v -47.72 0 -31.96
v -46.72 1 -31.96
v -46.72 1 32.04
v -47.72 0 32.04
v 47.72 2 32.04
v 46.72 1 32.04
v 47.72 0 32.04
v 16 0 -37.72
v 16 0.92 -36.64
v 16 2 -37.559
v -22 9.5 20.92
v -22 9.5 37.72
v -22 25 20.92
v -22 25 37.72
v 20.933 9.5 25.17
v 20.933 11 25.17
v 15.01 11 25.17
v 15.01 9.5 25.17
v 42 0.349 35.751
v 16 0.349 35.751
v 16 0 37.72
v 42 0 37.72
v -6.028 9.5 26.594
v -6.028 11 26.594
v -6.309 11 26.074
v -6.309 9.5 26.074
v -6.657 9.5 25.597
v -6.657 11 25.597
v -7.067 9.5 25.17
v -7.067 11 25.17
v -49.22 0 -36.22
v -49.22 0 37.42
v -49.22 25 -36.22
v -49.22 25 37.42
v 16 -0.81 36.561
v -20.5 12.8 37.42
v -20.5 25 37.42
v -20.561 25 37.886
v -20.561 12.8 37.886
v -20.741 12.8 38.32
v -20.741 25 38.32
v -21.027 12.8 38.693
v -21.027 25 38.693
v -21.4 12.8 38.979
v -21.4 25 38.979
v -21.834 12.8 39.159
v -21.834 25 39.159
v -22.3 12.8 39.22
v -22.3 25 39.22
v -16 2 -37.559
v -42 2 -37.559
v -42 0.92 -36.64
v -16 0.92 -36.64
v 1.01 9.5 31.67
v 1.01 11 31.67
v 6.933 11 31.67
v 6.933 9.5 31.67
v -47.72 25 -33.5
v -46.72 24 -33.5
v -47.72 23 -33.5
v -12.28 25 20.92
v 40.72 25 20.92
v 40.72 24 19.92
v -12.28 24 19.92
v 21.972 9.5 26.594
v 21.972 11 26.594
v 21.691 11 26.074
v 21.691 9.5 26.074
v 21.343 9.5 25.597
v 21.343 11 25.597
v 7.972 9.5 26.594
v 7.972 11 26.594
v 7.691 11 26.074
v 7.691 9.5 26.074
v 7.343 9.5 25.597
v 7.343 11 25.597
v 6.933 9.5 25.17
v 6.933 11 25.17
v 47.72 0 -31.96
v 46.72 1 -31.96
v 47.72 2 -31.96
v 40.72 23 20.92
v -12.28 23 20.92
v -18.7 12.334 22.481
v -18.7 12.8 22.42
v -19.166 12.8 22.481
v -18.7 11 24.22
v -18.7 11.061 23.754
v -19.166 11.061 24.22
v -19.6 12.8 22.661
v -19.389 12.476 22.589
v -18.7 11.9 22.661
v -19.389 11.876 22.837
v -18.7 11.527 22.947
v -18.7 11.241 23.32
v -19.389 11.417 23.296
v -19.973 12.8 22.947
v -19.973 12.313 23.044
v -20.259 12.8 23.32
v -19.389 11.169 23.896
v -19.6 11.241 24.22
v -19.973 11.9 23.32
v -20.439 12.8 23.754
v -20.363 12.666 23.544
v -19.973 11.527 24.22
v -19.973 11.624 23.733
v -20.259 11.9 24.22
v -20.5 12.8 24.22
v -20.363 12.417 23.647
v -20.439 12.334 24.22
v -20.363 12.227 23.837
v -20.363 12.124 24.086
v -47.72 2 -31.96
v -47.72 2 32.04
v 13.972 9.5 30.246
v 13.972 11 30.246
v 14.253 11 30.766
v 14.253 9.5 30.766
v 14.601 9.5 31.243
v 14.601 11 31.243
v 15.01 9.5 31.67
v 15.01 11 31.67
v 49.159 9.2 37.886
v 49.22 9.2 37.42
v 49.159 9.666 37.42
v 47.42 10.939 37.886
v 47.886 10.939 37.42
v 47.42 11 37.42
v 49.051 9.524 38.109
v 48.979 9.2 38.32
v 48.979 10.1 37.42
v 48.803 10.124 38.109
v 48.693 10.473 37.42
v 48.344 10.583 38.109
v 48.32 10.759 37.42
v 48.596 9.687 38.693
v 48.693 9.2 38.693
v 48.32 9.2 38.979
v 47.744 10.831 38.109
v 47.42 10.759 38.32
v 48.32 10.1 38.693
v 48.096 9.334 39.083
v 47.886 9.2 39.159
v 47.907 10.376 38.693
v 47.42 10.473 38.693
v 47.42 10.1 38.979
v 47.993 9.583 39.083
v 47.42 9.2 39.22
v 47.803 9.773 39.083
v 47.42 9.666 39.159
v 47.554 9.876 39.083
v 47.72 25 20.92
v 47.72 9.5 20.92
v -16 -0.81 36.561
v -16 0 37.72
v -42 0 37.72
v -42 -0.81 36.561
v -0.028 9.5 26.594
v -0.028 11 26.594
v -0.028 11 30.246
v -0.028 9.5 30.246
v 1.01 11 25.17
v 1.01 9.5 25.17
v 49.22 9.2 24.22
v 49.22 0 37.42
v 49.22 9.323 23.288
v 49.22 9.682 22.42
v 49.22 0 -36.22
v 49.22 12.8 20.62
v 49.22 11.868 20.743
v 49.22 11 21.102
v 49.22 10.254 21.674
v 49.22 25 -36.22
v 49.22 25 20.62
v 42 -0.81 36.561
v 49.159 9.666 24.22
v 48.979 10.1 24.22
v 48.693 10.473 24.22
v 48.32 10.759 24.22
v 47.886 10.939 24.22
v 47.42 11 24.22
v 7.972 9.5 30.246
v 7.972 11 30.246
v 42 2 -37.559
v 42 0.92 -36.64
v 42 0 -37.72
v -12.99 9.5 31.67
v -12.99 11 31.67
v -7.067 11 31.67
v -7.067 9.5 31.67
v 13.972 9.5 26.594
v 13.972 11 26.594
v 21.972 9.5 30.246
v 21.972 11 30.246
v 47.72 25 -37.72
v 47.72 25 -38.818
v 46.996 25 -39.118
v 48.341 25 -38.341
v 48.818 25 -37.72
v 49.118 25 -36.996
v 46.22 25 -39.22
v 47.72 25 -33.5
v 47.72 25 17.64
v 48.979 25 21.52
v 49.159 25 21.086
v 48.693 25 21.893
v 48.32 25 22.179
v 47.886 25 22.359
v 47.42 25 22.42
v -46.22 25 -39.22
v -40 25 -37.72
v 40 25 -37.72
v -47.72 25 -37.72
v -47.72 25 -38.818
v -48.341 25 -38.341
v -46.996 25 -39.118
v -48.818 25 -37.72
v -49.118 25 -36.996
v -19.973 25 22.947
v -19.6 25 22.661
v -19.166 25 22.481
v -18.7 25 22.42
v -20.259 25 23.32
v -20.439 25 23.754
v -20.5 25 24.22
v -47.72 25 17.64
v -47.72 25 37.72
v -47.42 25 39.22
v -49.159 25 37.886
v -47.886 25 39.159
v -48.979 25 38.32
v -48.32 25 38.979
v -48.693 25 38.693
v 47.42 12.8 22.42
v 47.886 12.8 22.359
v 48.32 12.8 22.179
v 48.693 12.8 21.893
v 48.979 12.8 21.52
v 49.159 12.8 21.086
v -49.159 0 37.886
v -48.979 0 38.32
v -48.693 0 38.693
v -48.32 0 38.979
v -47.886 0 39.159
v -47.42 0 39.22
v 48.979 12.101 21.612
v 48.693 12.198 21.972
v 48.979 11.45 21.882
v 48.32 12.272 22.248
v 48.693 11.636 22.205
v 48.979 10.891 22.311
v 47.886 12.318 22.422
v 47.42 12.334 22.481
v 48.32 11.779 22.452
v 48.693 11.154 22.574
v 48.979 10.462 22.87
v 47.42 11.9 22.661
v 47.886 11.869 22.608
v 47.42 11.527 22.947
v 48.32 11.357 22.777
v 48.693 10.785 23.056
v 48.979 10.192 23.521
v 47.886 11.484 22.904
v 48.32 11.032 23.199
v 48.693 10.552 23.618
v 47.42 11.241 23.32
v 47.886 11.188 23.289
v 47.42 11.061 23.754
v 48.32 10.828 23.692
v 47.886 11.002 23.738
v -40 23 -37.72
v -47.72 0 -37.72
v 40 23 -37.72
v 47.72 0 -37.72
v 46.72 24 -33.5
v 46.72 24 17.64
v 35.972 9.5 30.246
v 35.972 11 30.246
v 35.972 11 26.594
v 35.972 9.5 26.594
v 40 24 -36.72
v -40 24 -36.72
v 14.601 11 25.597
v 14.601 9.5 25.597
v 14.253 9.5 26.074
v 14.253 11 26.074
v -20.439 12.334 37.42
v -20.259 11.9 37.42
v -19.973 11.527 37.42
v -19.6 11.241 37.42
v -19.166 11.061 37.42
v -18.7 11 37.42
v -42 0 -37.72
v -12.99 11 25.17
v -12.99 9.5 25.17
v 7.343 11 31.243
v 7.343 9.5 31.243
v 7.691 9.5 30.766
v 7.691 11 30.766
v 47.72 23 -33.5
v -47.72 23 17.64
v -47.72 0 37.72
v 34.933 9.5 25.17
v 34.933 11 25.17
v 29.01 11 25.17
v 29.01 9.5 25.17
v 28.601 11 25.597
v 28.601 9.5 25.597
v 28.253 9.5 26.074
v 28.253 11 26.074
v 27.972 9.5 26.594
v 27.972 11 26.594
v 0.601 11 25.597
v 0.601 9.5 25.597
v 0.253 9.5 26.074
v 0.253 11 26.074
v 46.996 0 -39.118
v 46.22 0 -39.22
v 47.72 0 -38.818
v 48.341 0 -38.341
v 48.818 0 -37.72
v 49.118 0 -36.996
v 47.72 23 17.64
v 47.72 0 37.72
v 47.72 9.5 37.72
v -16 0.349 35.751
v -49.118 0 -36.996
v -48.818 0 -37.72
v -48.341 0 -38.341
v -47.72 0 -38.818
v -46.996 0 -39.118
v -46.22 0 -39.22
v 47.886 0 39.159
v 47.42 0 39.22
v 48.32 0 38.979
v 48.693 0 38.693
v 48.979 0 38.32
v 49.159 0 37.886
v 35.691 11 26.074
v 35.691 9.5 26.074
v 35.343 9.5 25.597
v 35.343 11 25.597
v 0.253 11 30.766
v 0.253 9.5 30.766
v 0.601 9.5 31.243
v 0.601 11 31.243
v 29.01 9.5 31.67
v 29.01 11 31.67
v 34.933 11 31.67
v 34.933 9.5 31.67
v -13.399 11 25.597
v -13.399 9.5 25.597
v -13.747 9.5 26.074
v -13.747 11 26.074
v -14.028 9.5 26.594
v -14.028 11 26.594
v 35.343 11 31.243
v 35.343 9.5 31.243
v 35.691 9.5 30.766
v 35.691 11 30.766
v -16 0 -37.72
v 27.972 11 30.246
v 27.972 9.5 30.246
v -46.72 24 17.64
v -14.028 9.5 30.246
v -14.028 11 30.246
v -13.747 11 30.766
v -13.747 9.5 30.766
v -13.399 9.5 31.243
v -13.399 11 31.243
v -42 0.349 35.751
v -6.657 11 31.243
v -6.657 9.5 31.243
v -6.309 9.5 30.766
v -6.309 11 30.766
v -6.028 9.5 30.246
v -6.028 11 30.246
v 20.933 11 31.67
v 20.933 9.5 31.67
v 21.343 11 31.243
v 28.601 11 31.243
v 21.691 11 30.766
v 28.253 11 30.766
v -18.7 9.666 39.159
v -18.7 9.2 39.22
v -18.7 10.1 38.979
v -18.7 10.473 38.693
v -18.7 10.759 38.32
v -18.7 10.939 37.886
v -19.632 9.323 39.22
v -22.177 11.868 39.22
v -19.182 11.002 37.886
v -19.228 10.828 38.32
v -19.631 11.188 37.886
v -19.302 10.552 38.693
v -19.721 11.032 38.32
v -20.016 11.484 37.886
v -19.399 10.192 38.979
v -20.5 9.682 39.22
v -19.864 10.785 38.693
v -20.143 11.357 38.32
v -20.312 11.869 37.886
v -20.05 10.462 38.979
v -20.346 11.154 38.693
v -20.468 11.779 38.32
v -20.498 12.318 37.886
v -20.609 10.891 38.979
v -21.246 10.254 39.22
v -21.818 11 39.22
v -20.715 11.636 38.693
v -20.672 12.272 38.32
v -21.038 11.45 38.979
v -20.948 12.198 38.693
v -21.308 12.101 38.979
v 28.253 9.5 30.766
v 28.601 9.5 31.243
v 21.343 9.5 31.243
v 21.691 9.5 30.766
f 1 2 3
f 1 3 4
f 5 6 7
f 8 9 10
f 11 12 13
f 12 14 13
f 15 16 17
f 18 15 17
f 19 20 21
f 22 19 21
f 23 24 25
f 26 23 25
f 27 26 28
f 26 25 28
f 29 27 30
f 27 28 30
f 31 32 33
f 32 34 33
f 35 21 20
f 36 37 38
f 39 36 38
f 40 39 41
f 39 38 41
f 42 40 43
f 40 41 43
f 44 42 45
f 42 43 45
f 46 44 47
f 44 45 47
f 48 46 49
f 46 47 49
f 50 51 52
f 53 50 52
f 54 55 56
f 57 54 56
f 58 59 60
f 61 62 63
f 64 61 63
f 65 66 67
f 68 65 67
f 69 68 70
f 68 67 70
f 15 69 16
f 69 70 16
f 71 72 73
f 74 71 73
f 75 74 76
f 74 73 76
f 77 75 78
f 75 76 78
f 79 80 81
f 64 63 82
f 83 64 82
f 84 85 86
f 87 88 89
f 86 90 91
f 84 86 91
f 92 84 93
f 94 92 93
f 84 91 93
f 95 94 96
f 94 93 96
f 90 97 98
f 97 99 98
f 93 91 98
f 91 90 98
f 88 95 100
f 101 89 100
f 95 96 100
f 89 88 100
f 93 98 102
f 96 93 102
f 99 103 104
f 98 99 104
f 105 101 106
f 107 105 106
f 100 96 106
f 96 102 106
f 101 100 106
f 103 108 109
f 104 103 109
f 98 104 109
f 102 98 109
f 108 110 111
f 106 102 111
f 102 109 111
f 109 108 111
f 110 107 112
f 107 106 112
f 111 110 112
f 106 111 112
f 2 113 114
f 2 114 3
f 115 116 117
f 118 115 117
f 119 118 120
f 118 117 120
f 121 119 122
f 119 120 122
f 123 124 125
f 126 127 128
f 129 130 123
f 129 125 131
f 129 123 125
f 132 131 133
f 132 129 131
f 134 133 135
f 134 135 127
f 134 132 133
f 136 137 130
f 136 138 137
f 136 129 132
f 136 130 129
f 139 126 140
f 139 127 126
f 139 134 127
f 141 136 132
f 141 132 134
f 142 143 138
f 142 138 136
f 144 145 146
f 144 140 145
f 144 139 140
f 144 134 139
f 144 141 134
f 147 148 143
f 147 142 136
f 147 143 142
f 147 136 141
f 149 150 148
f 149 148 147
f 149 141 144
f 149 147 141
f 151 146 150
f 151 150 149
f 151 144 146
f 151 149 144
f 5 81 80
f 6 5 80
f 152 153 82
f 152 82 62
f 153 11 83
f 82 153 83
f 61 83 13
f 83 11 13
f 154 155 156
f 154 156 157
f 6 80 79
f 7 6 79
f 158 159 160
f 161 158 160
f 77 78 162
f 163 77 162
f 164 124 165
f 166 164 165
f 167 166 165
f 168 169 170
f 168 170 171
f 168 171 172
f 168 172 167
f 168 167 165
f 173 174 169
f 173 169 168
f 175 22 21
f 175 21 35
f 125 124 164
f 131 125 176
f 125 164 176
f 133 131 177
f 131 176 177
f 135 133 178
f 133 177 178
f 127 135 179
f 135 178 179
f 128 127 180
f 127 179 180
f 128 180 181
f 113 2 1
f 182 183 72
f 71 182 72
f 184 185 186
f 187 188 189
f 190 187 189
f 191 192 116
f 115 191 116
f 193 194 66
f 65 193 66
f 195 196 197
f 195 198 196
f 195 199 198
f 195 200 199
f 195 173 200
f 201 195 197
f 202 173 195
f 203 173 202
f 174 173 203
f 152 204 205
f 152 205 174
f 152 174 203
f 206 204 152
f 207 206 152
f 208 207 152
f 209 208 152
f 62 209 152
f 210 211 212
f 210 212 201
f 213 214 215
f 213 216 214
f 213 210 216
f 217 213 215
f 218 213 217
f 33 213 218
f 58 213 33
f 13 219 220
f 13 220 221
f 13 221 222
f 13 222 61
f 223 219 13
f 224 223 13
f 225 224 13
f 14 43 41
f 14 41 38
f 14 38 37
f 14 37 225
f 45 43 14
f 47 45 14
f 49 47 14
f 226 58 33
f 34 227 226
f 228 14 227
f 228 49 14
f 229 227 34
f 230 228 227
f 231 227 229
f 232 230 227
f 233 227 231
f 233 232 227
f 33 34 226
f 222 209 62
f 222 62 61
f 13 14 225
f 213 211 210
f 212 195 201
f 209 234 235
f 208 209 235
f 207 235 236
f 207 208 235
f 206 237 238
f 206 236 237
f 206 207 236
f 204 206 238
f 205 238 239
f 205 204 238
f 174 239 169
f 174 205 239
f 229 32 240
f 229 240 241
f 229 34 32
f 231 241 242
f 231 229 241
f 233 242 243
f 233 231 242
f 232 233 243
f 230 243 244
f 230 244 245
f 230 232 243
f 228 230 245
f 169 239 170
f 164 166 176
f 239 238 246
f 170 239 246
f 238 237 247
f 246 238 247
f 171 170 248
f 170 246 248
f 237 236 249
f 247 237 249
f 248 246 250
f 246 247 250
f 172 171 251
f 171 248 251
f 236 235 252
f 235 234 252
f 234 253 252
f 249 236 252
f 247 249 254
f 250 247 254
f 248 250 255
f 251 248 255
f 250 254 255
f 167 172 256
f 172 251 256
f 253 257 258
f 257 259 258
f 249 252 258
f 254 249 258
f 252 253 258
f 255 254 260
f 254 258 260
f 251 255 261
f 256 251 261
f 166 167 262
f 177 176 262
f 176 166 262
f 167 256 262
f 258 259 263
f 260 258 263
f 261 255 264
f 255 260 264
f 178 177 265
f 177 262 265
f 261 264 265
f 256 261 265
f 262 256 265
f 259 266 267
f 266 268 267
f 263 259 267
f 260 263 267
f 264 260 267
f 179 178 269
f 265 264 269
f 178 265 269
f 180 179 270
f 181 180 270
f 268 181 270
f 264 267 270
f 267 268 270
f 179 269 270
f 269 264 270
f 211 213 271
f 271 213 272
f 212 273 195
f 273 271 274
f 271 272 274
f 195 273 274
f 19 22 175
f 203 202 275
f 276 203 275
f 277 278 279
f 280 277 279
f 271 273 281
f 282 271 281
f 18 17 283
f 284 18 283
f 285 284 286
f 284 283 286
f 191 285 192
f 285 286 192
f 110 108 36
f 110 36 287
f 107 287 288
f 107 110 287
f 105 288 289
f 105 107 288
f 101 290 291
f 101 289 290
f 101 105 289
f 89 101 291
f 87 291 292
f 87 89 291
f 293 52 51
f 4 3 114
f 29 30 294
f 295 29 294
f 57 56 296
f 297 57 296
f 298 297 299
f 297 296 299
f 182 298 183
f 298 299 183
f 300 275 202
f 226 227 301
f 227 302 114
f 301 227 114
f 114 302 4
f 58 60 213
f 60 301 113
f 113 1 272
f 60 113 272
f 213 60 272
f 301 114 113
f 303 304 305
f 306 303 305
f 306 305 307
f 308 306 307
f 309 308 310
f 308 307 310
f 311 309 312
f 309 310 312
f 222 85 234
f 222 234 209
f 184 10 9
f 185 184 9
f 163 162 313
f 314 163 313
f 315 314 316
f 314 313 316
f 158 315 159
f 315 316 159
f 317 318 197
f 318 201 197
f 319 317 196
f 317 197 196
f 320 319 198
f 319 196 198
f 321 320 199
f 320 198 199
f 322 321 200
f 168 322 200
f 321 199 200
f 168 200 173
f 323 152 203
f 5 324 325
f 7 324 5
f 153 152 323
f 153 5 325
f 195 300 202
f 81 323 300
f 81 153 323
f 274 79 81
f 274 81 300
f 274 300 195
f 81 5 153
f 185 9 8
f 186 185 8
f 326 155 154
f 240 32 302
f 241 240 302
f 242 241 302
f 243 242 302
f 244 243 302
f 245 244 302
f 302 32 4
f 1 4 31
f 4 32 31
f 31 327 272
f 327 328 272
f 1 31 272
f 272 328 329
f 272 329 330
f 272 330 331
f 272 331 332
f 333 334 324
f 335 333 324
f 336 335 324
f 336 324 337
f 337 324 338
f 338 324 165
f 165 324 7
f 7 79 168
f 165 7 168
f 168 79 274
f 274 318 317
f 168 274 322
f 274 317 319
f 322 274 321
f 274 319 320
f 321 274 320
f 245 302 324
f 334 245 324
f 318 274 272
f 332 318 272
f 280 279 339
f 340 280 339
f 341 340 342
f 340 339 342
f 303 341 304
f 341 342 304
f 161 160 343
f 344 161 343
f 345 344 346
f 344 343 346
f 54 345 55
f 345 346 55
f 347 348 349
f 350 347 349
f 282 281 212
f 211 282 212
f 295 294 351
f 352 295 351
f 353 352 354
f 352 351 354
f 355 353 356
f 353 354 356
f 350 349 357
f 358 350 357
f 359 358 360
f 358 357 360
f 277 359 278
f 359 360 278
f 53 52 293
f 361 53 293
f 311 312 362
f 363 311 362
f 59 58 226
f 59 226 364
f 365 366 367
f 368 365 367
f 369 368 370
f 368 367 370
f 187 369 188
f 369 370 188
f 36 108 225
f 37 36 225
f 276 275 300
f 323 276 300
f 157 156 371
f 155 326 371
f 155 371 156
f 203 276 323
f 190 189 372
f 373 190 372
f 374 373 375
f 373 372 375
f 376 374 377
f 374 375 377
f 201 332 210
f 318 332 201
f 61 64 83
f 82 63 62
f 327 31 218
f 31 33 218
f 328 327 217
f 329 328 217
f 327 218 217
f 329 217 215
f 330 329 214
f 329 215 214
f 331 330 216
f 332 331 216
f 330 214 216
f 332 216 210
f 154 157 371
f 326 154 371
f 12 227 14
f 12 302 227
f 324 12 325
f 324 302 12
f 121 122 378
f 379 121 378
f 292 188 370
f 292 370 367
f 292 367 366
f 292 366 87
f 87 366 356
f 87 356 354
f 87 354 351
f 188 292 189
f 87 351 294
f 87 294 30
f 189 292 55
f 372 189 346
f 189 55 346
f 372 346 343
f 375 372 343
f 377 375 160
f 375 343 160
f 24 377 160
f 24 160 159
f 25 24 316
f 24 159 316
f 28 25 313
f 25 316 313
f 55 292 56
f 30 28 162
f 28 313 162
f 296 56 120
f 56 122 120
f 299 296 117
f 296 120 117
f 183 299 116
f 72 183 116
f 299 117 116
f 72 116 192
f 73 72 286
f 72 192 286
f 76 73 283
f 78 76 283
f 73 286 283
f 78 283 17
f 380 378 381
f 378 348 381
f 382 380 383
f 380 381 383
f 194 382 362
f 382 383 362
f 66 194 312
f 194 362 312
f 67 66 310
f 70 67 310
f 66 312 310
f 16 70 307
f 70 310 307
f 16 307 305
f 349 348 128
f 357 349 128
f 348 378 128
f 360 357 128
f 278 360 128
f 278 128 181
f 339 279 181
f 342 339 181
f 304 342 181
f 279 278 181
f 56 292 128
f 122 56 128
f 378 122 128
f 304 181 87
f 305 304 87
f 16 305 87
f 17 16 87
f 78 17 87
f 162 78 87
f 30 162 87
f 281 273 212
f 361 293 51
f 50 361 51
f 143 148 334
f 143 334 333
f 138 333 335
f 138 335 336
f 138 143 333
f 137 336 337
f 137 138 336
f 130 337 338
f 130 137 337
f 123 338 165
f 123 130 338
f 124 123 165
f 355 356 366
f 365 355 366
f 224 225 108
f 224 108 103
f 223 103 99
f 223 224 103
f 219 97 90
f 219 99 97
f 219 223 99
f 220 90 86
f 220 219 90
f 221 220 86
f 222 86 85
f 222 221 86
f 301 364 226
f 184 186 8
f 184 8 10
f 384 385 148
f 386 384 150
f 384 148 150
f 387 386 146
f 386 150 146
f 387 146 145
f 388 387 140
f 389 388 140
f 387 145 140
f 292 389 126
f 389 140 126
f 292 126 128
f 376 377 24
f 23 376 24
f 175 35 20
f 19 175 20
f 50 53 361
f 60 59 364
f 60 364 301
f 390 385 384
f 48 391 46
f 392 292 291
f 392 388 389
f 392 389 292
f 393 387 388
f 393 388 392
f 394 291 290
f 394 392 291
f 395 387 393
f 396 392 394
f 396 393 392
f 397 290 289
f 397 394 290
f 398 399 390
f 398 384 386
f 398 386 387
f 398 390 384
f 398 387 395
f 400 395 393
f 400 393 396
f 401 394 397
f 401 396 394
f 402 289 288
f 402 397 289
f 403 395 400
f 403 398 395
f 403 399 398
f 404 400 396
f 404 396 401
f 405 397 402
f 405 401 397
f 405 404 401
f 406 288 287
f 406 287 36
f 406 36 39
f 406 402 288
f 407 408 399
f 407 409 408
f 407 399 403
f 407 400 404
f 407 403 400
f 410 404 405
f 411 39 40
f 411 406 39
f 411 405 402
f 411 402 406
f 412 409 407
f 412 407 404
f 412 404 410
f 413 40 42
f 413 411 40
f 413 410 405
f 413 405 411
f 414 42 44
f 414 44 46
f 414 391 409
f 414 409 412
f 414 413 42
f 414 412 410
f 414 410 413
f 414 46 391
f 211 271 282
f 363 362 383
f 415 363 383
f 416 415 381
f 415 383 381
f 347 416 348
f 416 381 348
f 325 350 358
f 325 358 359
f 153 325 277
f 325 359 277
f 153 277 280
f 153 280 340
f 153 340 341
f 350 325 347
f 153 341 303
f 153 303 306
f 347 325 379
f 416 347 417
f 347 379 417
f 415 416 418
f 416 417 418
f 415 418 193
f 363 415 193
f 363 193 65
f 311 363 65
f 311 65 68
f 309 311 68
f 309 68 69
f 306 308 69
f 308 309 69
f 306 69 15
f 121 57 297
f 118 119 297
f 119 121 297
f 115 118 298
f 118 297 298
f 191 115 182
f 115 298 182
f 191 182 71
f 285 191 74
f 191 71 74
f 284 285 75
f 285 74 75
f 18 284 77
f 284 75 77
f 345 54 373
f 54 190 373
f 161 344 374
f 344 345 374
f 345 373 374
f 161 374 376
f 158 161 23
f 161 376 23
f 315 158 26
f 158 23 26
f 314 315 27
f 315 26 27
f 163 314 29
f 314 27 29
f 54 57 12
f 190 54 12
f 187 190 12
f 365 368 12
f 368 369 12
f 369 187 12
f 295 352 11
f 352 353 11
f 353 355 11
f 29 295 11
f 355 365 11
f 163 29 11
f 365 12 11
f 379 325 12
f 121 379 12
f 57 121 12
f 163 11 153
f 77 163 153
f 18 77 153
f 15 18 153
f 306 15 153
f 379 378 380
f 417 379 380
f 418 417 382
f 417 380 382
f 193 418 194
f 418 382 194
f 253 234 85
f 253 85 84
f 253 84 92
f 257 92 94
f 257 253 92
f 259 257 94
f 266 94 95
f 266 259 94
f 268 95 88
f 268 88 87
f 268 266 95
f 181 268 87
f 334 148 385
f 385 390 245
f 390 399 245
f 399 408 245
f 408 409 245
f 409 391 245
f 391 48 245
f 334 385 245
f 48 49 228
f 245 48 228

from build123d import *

# Parameters (mm, degrees)
SKETCH1_W                 = 98.44
SKETCH1_H                 = 78.44
SKETCH1_W_2               = 95.44
SKETCH1_H_2               = 75.44
BOSS_EXTRUDE1_DEPTH       = 25
SKETCH4_W                 = 98.44
SKETCH4_H                 = 16.8
BOSS_EXTRUDE2_DEPTH       = 1.5
CUT_EXTRUDE1_DEPTH        = 1.6
SKETCH5_W                 = 18
SKETCH5_H                 = 14
CUT_EXTRUDE2_DEPTH        = 70.5
BOSS_EXTRUDE9_DEPTH       = 49.22
BOSS_EXTRUDE9_DEPTH_BACK  = 22
SKETCH7_W                 = 1.5
SKETCH7_H                 = 15.5
BOSS_EXTRUDE10_START      = -56
BOSS_EXTRUDE10_DEPTH      = 64
BOSS_EXTRUDE11_DEPTH      = 42
BOSS_EXTRUDE11_DEPTH_BACK = 42
CUT_EXTRUDE3_DEPTH        = 16
CUT_EXTRUDE3_DEPTH_BACK   = 16
BOSS_EXTRUDE12_DEPTH      = 42
BOSS_EXTRUDE12_DEPTH_BACK = 42
CUT_EXTRUDE4_DEPTH        = 16
CUT_EXTRUDE4_DEPTH_BACK   = 16
BOSS_EXTRUDE13_DEPTH      = 40
BOSS_EXTRUDE13_DEPTH_BACK = 40
BOSS_EXTRUDE14_START      = -15.64
BOSS_EXTRUDE14_DEPTH      = 51.14
FILLET4_R                 = 1.8
SKETCH16_W                = 1.5
SKETCH16_H                = 14
BOSS_EXTRUDE15_DEPTH      = 16.8
SKETCH17_W                = 15.3
SKETCH17_H                = 1.5
CUT_EXTRUDE6_DEPTH        = 25.72
FILLET5_R                 = 1.8
BOSS_EXTRUDE16_DEPTH      = 53
FILLET6_R                 = 3


with BuildPart() as part:
    # Sketch1 → Boss-Extrude1 (new body)
    with BuildSketch(Plane(origin=(0, 0, 0), x_dir=(1, 0, 0), z_dir=(0, 1, 0))):
        Rectangle(SKETCH1_W, SKETCH1_H)
        Rectangle(SKETCH1_W_2, SKETCH1_H_2, mode=Mode.SUBTRACT)
    extrude(amount=BOSS_EXTRUDE1_DEPTH)

    # Sketch4 → Boss-Extrude2 (add)
    with BuildSketch(Plane(origin=(0, 11, 0), x_dir=(-1, 0, 0), z_dir=(0, -1, 0))):
        with Locations((0, -30.82)):
            Rectangle(SKETCH4_W, SKETCH4_H)
    extrude(amount=BOSS_EXTRUDE2_DEPTH)

    # Sketch3 → Cut-Extrude1 (cut)
    with BuildSketch(Plane(origin=(0, 11, 0), x_dir=(-1, 0, 0), z_dir=(0, -1, 0))):
        with BuildLine():
            Line((-34.933489157, -25.17), (-29.010238143, -25.17))
            ThreePointArc((-29.010238143, -25.17), (-28.418962197, -25.829514156), (-27.97186365, -26.594150707))
            Line((-27.97186365, -26.594150707), (-27.97186365, -30.245849293))
            ThreePointArc((-27.97186365, -30.245849293), (-28.418962197, -31.010485844), (-29.010238143, -31.67))
            Line((-29.010238143, -31.67), (-34.933489157, -31.67))
            ThreePointArc((-34.933489157, -31.67), (-35.524765103, -31.010485844), (-35.97186365, -30.245849293))
            Line((-35.97186365, -30.245849293), (-35.97186365, -26.594150707))
            ThreePointArc((-35.97186365, -26.594150707), (-35.524765103, -25.829514156), (-34.933489157, -25.17))
        make_face()
        with BuildLine():
            Line((-20.933489157, -25.17), (-15.010238143, -25.17))
            ThreePointArc((-15.010238143, -25.17), (-14.418962197, -25.829514156), (-13.97186365, -26.594150707))
            Line((-13.97186365, -26.594150707), (-13.97186365, -30.245849293))
            ThreePointArc((-13.97186365, -30.245849293), (-14.418962197, -31.010485844), (-15.010238143, -31.67))
            Line((-15.010238143, -31.67), (-20.933489157, -31.67))
            ThreePointArc((-20.933489157, -31.67), (-21.524765103, -31.010485844), (-21.97186365, -30.245849293))
            Line((-21.97186365, -30.245849293), (-21.97186365, -26.594150707))
            ThreePointArc((-21.97186365, -26.594150707), (-21.524765103, -25.829514156), (-20.933489157, -25.17))
        make_face()
        with BuildLine():
            Line((-6.933489157, -25.17), (-1.010238143, -25.17))
            ThreePointArc((-1.010238143, -25.17), (-0.418962197, -25.829514156), (0.02813635, -26.594150707))
            Line((0.02813635, -26.594150707), (0.02813635, -30.245849293))
            ThreePointArc((0.02813635, -30.245849293), (-0.418962197, -31.010485844), (-1.010238143, -31.67))
            Line((-1.010238143, -31.67), (-6.933489157, -31.67))
            ThreePointArc((-6.933489157, -31.67), (-7.524765103, -31.010485844), (-7.97186365, -30.245849293))
            Line((-7.97186365, -30.245849293), (-7.97186365, -26.594150707))
            ThreePointArc((-7.97186365, -26.594150707), (-7.524765103, -25.829514156), (-6.933489157, -25.17))
        make_face()
        with BuildLine():
            Line((7.066510843, -25.17), (12.989761857, -25.17))
            ThreePointArc((12.989761857, -25.17), (13.581037803, -25.829514156), (14.02813635, -26.594150707))
            Line((14.02813635, -26.594150707), (14.02813635, -30.245849293))
            ThreePointArc((14.02813635, -30.245849293), (13.581037803, -31.010485844), (12.989761857, -31.67))
            Line((12.989761857, -31.67), (7.066510843, -31.67))
            ThreePointArc((7.066510843, -31.67), (6.475234897, -31.010485844), (6.02813635, -30.245849293))
            Line((6.02813635, -30.245849293), (6.02813635, -26.594150707))
            ThreePointArc((6.02813635, -26.594150707), (6.475234897, -25.829514156), (7.066510843, -25.17))
        make_face()
    extrude(amount=CUT_EXTRUDE1_DEPTH, mode=Mode.SUBTRACT)

    # Sketch5 → Cut-Extrude2 (cut)
    with BuildSketch(Plane(origin=(49.22, 0, 0), x_dir=(0, 0, -1), z_dir=(1, 0, 0))):
        with Locations((-30.22, 18)):
            Rectangle(SKETCH5_W, SKETCH5_H)
    extrude(amount=-CUT_EXTRUDE2_DEPTH, mode=Mode.SUBTRACT)

    # Sketch7 → Boss-Extrude9 (add, two sides: drawn at the far end of the back side and taken through both)
    with BuildSketch(Plane(origin=(0, 0, 0), x_dir=(0, 0, -1), z_dir=(1, 0, 0)).offset(-BOSS_EXTRUDE9_DEPTH_BACK)):
        with Locations((-21.67, 17.25)):
            Rectangle(SKETCH7_W, SKETCH7_H)
    extrude(amount=BOSS_EXTRUDE9_DEPTH + BOSS_EXTRUDE9_DEPTH_BACK)

    # Sketch9 → Boss-Extrude10 (add)
    with BuildSketch(Plane.XY.offset(24.04).offset(BOSS_EXTRUDE10_START)):
        Polygon((-47.72, 2), (-46.72, 1), (-47.72, 0), align=None)
    boss_extrude10 = extrude(amount=BOSS_EXTRUDE10_DEPTH)

    # Mirror1: Boss-Extrude10 across plane
    add(boss_extrude10.mirror(Plane(origin=(0, 0, 0), x_dir=(0, 0, 1), z_dir=(1, 0, 0))))

    # Sketch12 → Boss-Extrude13 (add, two sides: drawn at the far end of the back side and taken through both)
    with BuildSketch(Plane(origin=(0, 0, 0), x_dir=(0, 0, -1), z_dir=(1, 0, 0)).offset(-BOSS_EXTRUDE13_DEPTH_BACK)):
        Polygon((36.72, 24), (37.72, 25), (37.72, 23), align=None)
    extrude(amount=BOSS_EXTRUDE13_DEPTH + BOSS_EXTRUDE13_DEPTH_BACK)

    # Sketch14 → Boss-Extrude14 (add)
    with BuildSketch(Plane.XY.offset(-17.86).offset(BOSS_EXTRUDE14_START)):
        Polygon((47.72, 25), (46.72, 24), (47.72, 23), align=None)
    boss_extrude14 = extrude(amount=BOSS_EXTRUDE14_DEPTH)

    # Mirror3: Boss-Extrude14 across plane
    add(boss_extrude14.mirror(Plane(origin=(0, 0, 0), x_dir=(0, 0, 1), z_dir=(1, 0, 0))))

    # Fillet4
    fillet4_edges = [part.edges().sort_by_distance(p)[0] for p in [
        (49.22, 5.5, 39.22),
        (49.22, 11, 30.82),
        (13.61, 11, 22.42),
        (49.22, 18, 22.42),
        (-49.22, 12.5, 39.22),
    ]]
    fillet(fillet4_edges, radius=FILLET4_R)

    # Sketch16 → Boss-Extrude15 (add)
    with BuildSketch(Plane.XY.offset(22.42)):
        with Locations((-21.25, 18)):
            Rectangle(SKETCH16_W, SKETCH16_H)
    extrude(amount=BOSS_EXTRUDE15_DEPTH)

    # Sketch17 → Cut-Extrude6 (cut)
    with BuildSketch(Plane(origin=(-47.72, 0, 0), x_dir=(0, 0, -1), z_dir=(1, 0, 0))):
        with Locations((-30.07, 10.25)):
            Rectangle(SKETCH17_W, SKETCH17_H)
    extrude(amount=CUT_EXTRUDE6_DEPTH, mode=Mode.SUBTRACT)

    # Fillet5
    # the kernel refuses this fillet: 1.8 mm, written as the material it adds along each edge
    with BuildSketch(Plane(origin=(-20.5, 12.8, 24.22), x_dir=(0, 0, -1), z_dir=(0, 1, 0))) as fillet5_piece_1:
        with BuildLine():
            CenterArc((1.8 - FILLET5_R, -FILLET5_R), FILLET5_R, 0, 90)
            Line((1.8 - FILLET5_R, 0), (1.8, 0))
            Line((1.8, 0), (1.8, -FILLET5_R))
        make_face()
    revolve(axis=Axis((-20.5, 12.8, 24.22), (-1, 0, 0)), revolution_arc=90)
    with BuildSketch(Plane(origin=(-20.5, 11, 24.22), x_dir=(1, 0, 0), z_dir=(0, 0, 1))) as fillet5_piece_2:
        with BuildLine():
            CenterArc((FILLET5_R, FILLET5_R), FILLET5_R, 180, 90)
            Line((0, FILLET5_R), (0, 0))
            Line((0, 0), (FILLET5_R, 0))
        make_face()
    extrude(amount=15)
    with BuildSketch(Plane(origin=(-20.5, 25, 22.42), x_dir=(1, 0, 0), z_dir=(0, -1, 0))) as fillet5_piece_3:
        with BuildLine():
            CenterArc((FILLET5_R, FILLET5_R), FILLET5_R, 180, 90)
            Line((0, FILLET5_R), (0, 0))
            Line((0, 0), (FILLET5_R, 0))
        make_face()
    extrude(amount=12.2)
    # the kernel refuses this fillet: 1.8 mm, written as the material it takes off along each edge
    with BuildSketch(Plane(origin=(47.42, 9.2, 37.42), x_dir=(0, 1, 0), z_dir=(0, 0, 1))) as fillet5_2_piece_1_section:
        Polygon((0, 0), (FILLET5_R, 0), (FILLET5_R, -FILLET5_R), (0, -FILLET5_R), align=None)
    fillet5_2_piece_1 = extrude(amount=FILLET5_R, mode=Mode.PRIVATE)
    fillet5_2_piece_1 = fillet5_2_piece_1 - Plane(origin=(47.42, 9.2, 37.42), x_dir=(-0.7071067811865475, -0.7071067811865475, 0), z_dir=(0, 0, 1)) * Sphere(FILLET5_R, mode=Mode.PRIVATE)
    add(fillet5_2_piece_1, mode=Mode.SUBTRACT)
    with BuildSketch(Plane(origin=(47.42, 11, 39.22), x_dir=(0, -1, 0), z_dir=(-1, 0, 0))) as fillet5_2_piece_2:
        with BuildLine():
            CenterArc((FILLET5_R, -FILLET5_R), FILLET5_R, 90, 90)
            Line((0, -FILLET5_R), (0, 0))
            Line((0, 0), (FILLET5_R, 0))
        make_face()
    extrude(amount=66.12, mode=Mode.SUBTRACT)
    with BuildSketch(Plane(origin=(-20.5, 29.5, 39.22), x_dir=(-1, 0, 0), z_dir=(0, -1, 0))) as fillet5_2_piece_3:
        with BuildLine():
            CenterArc((FILLET5_R, FILLET5_R), FILLET5_R, 180, 90)
            Line((0, FILLET5_R), (0, 0))
            Line((0, 0), (FILLET5_R, 0))
        make_face()
    extrude(amount=16.7, mode=Mode.SUBTRACT)
    with BuildSketch(Plane(origin=(-18.7, 12.8, 39.22), x_dir=(0, -1, 0), z_dir=(1, 0, 0))) as fillet5_2_piece_4:
        with BuildLine():
            CenterArc((1.8 + FILLET5_R, FILLET5_R), FILLET5_R, 180, 90)
            Line((1.8, FILLET5_R), (1.8, 0))
            Line((1.8, 0), (1.8 + FILLET5_R, 0))
        make_face()
    revolve(axis=Axis((-18.7, 12.8, 39.22), (0, 0, -1)), revolution_arc=90, mode=Mode.SUBTRACT)

    # Sketch19 → Boss-Extrude16 (add)
    with BuildSketch(Plane.ZY.offset(-40.72)):
        Polygon((20.92, 25), (19.92, 24), (20.92, 23), align=None)
    extrude(amount=BOSS_EXTRUDE16_DEPTH)

    # Fillet6
    fillet6_edges = [part.edges().sort_by_distance(p)[0] for p in [
        (-49.22, 12.5, -39.22),
        (49.22, 12.5, -39.22),
    ]]
    fillet(fillet6_edges, radius=FILLET6_R)


with BuildPart() as body_2:
    # Sketch10 → Boss-Extrude11 (new, two sides: drawn at the far end of the back side and taken through both)
    with BuildSketch(Plane(origin=(0, 0, 0), x_dir=(0, 0, -1), z_dir=(1, 0, 0)).offset(-BOSS_EXTRUDE11_DEPTH_BACK)):
        Polygon((-37.72, 0), (-36.560859755, -0.810181394), (-35.75067836, 0.348958851), align=None)
    extrude(amount=BOSS_EXTRUDE11_DEPTH + BOSS_EXTRUDE11_DEPTH_BACK)

    # Sketch10<2> → Cut-Extrude3 (cut, two sides: drawn at the far end of the back side and taken through both)
    with BuildSketch(Plane(origin=(0, 0, 0), x_dir=(0, 0, -1), z_dir=(1, 0, 0)).offset(-CUT_EXTRUDE3_DEPTH_BACK)):
        Polygon((-37.72, 0), (-36.560859755, -0.810181394), (-35.75067836, 0.348958851), align=None)
    extrude(amount=CUT_EXTRUDE3_DEPTH + CUT_EXTRUDE3_DEPTH_BACK, mode=Mode.SUBTRACT)


with BuildPart() as cut_extrude3_piece_1:
    # of the separate pieces the step leaves, piece 1, a body of its own (cut_extrude3_pieces)
    add(body_2.part.solids().sort_by_distance((-16, 0, 37.72))[0])


with BuildPart() as cut_extrude3_piece_2:
    # of the separate pieces the step leaves, piece 2, a body of its own (cut_extrude3_pieces)
    add(body_2.part.solids().sort_by_distance((42, 0, 37.72))[0])


with BuildPart() as body_4:
    # Sketch11 → Boss-Extrude12 (new, two sides: drawn at the far end of the back side and taken through both)
    with BuildSketch(Plane(origin=(0, 0, 0), x_dir=(0, 0, -1), z_dir=(1, 0, 0)).offset(-BOSS_EXTRUDE12_DEPTH_BACK)):
        Polygon((37.559012834, 2), (36.639506417, 0.919506417), (37.72, 0), align=None)
    extrude(amount=BOSS_EXTRUDE12_DEPTH + BOSS_EXTRUDE12_DEPTH_BACK)

    # Sketch11<2> → Cut-Extrude4 (cut, two sides: drawn at the far end of the back side and taken through both)
    with BuildSketch(Plane(origin=(0, 0, 0), x_dir=(0, 0, -1), z_dir=(1, 0, 0)).offset(-CUT_EXTRUDE4_DEPTH_BACK)):
        Polygon((37.559012834, 2), (36.639506417, 0.919506417), (37.72, 0), align=None)
    extrude(amount=CUT_EXTRUDE4_DEPTH + CUT_EXTRUDE4_DEPTH_BACK, mode=Mode.SUBTRACT)


with BuildPart() as cut_extrude4_piece_1:
    # of the separate pieces the step leaves, piece 1, a body of its own (cut_extrude4_pieces)
    add(body_4.part.solids().sort_by_distance((42, 2, -37.559012834))[0])


with BuildPart() as cut_extrude4_piece_2:
    # of the separate pieces the step leaves, piece 2, a body of its own (cut_extrude4_pieces)
    add(body_4.part.solids().sort_by_distance((-16, 2, -37.559012834))[0])


solid = Compound([part.part, cut_extrude3_piece_1.part, cut_extrude3_piece_2.part, cut_extrude4_piece_1.part, cut_extrude4_piece_2.part])
